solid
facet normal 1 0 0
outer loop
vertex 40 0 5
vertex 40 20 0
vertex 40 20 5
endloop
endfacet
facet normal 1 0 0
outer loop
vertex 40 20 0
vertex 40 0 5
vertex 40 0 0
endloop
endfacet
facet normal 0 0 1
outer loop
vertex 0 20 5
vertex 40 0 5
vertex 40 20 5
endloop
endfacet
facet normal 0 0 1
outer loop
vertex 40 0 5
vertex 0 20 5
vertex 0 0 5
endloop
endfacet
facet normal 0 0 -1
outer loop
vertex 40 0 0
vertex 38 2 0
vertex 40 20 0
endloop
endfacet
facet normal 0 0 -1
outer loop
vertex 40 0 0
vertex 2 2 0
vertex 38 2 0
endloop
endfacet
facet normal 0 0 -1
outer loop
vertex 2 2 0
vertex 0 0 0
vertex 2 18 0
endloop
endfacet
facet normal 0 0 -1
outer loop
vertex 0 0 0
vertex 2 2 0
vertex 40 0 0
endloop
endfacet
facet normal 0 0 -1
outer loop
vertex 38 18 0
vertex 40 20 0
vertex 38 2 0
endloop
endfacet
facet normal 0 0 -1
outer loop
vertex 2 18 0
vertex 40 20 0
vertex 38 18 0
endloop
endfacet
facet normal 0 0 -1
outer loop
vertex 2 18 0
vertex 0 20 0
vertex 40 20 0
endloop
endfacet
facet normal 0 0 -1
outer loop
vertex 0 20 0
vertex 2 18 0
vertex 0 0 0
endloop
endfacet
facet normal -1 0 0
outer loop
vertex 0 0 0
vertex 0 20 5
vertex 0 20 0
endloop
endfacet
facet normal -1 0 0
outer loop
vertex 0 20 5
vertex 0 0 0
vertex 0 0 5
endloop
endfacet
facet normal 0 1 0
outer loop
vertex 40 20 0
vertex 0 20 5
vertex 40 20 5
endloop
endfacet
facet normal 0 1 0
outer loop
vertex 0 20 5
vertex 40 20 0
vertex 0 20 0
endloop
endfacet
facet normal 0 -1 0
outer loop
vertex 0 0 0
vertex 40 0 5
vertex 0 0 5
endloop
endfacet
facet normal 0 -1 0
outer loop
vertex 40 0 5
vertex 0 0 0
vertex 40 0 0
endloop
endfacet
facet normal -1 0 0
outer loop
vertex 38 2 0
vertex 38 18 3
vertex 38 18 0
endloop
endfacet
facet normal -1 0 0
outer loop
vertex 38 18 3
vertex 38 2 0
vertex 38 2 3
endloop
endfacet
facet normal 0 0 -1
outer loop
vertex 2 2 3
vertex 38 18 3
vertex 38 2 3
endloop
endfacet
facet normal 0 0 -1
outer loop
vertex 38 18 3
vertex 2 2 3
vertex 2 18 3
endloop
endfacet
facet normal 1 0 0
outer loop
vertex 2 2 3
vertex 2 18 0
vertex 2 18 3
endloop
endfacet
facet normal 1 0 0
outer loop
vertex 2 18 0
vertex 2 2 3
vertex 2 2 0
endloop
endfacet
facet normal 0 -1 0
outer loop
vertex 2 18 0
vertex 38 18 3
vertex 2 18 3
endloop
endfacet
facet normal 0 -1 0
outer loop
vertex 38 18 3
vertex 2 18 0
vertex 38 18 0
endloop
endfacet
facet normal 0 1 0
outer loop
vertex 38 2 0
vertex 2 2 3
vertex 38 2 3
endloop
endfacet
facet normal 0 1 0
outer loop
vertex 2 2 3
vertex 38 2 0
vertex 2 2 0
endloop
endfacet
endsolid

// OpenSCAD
difference() {
    cube([40, 20, 5]);
    translate([2, 2, -1]) {
        cube([36, 16, 4]);
    }
}
